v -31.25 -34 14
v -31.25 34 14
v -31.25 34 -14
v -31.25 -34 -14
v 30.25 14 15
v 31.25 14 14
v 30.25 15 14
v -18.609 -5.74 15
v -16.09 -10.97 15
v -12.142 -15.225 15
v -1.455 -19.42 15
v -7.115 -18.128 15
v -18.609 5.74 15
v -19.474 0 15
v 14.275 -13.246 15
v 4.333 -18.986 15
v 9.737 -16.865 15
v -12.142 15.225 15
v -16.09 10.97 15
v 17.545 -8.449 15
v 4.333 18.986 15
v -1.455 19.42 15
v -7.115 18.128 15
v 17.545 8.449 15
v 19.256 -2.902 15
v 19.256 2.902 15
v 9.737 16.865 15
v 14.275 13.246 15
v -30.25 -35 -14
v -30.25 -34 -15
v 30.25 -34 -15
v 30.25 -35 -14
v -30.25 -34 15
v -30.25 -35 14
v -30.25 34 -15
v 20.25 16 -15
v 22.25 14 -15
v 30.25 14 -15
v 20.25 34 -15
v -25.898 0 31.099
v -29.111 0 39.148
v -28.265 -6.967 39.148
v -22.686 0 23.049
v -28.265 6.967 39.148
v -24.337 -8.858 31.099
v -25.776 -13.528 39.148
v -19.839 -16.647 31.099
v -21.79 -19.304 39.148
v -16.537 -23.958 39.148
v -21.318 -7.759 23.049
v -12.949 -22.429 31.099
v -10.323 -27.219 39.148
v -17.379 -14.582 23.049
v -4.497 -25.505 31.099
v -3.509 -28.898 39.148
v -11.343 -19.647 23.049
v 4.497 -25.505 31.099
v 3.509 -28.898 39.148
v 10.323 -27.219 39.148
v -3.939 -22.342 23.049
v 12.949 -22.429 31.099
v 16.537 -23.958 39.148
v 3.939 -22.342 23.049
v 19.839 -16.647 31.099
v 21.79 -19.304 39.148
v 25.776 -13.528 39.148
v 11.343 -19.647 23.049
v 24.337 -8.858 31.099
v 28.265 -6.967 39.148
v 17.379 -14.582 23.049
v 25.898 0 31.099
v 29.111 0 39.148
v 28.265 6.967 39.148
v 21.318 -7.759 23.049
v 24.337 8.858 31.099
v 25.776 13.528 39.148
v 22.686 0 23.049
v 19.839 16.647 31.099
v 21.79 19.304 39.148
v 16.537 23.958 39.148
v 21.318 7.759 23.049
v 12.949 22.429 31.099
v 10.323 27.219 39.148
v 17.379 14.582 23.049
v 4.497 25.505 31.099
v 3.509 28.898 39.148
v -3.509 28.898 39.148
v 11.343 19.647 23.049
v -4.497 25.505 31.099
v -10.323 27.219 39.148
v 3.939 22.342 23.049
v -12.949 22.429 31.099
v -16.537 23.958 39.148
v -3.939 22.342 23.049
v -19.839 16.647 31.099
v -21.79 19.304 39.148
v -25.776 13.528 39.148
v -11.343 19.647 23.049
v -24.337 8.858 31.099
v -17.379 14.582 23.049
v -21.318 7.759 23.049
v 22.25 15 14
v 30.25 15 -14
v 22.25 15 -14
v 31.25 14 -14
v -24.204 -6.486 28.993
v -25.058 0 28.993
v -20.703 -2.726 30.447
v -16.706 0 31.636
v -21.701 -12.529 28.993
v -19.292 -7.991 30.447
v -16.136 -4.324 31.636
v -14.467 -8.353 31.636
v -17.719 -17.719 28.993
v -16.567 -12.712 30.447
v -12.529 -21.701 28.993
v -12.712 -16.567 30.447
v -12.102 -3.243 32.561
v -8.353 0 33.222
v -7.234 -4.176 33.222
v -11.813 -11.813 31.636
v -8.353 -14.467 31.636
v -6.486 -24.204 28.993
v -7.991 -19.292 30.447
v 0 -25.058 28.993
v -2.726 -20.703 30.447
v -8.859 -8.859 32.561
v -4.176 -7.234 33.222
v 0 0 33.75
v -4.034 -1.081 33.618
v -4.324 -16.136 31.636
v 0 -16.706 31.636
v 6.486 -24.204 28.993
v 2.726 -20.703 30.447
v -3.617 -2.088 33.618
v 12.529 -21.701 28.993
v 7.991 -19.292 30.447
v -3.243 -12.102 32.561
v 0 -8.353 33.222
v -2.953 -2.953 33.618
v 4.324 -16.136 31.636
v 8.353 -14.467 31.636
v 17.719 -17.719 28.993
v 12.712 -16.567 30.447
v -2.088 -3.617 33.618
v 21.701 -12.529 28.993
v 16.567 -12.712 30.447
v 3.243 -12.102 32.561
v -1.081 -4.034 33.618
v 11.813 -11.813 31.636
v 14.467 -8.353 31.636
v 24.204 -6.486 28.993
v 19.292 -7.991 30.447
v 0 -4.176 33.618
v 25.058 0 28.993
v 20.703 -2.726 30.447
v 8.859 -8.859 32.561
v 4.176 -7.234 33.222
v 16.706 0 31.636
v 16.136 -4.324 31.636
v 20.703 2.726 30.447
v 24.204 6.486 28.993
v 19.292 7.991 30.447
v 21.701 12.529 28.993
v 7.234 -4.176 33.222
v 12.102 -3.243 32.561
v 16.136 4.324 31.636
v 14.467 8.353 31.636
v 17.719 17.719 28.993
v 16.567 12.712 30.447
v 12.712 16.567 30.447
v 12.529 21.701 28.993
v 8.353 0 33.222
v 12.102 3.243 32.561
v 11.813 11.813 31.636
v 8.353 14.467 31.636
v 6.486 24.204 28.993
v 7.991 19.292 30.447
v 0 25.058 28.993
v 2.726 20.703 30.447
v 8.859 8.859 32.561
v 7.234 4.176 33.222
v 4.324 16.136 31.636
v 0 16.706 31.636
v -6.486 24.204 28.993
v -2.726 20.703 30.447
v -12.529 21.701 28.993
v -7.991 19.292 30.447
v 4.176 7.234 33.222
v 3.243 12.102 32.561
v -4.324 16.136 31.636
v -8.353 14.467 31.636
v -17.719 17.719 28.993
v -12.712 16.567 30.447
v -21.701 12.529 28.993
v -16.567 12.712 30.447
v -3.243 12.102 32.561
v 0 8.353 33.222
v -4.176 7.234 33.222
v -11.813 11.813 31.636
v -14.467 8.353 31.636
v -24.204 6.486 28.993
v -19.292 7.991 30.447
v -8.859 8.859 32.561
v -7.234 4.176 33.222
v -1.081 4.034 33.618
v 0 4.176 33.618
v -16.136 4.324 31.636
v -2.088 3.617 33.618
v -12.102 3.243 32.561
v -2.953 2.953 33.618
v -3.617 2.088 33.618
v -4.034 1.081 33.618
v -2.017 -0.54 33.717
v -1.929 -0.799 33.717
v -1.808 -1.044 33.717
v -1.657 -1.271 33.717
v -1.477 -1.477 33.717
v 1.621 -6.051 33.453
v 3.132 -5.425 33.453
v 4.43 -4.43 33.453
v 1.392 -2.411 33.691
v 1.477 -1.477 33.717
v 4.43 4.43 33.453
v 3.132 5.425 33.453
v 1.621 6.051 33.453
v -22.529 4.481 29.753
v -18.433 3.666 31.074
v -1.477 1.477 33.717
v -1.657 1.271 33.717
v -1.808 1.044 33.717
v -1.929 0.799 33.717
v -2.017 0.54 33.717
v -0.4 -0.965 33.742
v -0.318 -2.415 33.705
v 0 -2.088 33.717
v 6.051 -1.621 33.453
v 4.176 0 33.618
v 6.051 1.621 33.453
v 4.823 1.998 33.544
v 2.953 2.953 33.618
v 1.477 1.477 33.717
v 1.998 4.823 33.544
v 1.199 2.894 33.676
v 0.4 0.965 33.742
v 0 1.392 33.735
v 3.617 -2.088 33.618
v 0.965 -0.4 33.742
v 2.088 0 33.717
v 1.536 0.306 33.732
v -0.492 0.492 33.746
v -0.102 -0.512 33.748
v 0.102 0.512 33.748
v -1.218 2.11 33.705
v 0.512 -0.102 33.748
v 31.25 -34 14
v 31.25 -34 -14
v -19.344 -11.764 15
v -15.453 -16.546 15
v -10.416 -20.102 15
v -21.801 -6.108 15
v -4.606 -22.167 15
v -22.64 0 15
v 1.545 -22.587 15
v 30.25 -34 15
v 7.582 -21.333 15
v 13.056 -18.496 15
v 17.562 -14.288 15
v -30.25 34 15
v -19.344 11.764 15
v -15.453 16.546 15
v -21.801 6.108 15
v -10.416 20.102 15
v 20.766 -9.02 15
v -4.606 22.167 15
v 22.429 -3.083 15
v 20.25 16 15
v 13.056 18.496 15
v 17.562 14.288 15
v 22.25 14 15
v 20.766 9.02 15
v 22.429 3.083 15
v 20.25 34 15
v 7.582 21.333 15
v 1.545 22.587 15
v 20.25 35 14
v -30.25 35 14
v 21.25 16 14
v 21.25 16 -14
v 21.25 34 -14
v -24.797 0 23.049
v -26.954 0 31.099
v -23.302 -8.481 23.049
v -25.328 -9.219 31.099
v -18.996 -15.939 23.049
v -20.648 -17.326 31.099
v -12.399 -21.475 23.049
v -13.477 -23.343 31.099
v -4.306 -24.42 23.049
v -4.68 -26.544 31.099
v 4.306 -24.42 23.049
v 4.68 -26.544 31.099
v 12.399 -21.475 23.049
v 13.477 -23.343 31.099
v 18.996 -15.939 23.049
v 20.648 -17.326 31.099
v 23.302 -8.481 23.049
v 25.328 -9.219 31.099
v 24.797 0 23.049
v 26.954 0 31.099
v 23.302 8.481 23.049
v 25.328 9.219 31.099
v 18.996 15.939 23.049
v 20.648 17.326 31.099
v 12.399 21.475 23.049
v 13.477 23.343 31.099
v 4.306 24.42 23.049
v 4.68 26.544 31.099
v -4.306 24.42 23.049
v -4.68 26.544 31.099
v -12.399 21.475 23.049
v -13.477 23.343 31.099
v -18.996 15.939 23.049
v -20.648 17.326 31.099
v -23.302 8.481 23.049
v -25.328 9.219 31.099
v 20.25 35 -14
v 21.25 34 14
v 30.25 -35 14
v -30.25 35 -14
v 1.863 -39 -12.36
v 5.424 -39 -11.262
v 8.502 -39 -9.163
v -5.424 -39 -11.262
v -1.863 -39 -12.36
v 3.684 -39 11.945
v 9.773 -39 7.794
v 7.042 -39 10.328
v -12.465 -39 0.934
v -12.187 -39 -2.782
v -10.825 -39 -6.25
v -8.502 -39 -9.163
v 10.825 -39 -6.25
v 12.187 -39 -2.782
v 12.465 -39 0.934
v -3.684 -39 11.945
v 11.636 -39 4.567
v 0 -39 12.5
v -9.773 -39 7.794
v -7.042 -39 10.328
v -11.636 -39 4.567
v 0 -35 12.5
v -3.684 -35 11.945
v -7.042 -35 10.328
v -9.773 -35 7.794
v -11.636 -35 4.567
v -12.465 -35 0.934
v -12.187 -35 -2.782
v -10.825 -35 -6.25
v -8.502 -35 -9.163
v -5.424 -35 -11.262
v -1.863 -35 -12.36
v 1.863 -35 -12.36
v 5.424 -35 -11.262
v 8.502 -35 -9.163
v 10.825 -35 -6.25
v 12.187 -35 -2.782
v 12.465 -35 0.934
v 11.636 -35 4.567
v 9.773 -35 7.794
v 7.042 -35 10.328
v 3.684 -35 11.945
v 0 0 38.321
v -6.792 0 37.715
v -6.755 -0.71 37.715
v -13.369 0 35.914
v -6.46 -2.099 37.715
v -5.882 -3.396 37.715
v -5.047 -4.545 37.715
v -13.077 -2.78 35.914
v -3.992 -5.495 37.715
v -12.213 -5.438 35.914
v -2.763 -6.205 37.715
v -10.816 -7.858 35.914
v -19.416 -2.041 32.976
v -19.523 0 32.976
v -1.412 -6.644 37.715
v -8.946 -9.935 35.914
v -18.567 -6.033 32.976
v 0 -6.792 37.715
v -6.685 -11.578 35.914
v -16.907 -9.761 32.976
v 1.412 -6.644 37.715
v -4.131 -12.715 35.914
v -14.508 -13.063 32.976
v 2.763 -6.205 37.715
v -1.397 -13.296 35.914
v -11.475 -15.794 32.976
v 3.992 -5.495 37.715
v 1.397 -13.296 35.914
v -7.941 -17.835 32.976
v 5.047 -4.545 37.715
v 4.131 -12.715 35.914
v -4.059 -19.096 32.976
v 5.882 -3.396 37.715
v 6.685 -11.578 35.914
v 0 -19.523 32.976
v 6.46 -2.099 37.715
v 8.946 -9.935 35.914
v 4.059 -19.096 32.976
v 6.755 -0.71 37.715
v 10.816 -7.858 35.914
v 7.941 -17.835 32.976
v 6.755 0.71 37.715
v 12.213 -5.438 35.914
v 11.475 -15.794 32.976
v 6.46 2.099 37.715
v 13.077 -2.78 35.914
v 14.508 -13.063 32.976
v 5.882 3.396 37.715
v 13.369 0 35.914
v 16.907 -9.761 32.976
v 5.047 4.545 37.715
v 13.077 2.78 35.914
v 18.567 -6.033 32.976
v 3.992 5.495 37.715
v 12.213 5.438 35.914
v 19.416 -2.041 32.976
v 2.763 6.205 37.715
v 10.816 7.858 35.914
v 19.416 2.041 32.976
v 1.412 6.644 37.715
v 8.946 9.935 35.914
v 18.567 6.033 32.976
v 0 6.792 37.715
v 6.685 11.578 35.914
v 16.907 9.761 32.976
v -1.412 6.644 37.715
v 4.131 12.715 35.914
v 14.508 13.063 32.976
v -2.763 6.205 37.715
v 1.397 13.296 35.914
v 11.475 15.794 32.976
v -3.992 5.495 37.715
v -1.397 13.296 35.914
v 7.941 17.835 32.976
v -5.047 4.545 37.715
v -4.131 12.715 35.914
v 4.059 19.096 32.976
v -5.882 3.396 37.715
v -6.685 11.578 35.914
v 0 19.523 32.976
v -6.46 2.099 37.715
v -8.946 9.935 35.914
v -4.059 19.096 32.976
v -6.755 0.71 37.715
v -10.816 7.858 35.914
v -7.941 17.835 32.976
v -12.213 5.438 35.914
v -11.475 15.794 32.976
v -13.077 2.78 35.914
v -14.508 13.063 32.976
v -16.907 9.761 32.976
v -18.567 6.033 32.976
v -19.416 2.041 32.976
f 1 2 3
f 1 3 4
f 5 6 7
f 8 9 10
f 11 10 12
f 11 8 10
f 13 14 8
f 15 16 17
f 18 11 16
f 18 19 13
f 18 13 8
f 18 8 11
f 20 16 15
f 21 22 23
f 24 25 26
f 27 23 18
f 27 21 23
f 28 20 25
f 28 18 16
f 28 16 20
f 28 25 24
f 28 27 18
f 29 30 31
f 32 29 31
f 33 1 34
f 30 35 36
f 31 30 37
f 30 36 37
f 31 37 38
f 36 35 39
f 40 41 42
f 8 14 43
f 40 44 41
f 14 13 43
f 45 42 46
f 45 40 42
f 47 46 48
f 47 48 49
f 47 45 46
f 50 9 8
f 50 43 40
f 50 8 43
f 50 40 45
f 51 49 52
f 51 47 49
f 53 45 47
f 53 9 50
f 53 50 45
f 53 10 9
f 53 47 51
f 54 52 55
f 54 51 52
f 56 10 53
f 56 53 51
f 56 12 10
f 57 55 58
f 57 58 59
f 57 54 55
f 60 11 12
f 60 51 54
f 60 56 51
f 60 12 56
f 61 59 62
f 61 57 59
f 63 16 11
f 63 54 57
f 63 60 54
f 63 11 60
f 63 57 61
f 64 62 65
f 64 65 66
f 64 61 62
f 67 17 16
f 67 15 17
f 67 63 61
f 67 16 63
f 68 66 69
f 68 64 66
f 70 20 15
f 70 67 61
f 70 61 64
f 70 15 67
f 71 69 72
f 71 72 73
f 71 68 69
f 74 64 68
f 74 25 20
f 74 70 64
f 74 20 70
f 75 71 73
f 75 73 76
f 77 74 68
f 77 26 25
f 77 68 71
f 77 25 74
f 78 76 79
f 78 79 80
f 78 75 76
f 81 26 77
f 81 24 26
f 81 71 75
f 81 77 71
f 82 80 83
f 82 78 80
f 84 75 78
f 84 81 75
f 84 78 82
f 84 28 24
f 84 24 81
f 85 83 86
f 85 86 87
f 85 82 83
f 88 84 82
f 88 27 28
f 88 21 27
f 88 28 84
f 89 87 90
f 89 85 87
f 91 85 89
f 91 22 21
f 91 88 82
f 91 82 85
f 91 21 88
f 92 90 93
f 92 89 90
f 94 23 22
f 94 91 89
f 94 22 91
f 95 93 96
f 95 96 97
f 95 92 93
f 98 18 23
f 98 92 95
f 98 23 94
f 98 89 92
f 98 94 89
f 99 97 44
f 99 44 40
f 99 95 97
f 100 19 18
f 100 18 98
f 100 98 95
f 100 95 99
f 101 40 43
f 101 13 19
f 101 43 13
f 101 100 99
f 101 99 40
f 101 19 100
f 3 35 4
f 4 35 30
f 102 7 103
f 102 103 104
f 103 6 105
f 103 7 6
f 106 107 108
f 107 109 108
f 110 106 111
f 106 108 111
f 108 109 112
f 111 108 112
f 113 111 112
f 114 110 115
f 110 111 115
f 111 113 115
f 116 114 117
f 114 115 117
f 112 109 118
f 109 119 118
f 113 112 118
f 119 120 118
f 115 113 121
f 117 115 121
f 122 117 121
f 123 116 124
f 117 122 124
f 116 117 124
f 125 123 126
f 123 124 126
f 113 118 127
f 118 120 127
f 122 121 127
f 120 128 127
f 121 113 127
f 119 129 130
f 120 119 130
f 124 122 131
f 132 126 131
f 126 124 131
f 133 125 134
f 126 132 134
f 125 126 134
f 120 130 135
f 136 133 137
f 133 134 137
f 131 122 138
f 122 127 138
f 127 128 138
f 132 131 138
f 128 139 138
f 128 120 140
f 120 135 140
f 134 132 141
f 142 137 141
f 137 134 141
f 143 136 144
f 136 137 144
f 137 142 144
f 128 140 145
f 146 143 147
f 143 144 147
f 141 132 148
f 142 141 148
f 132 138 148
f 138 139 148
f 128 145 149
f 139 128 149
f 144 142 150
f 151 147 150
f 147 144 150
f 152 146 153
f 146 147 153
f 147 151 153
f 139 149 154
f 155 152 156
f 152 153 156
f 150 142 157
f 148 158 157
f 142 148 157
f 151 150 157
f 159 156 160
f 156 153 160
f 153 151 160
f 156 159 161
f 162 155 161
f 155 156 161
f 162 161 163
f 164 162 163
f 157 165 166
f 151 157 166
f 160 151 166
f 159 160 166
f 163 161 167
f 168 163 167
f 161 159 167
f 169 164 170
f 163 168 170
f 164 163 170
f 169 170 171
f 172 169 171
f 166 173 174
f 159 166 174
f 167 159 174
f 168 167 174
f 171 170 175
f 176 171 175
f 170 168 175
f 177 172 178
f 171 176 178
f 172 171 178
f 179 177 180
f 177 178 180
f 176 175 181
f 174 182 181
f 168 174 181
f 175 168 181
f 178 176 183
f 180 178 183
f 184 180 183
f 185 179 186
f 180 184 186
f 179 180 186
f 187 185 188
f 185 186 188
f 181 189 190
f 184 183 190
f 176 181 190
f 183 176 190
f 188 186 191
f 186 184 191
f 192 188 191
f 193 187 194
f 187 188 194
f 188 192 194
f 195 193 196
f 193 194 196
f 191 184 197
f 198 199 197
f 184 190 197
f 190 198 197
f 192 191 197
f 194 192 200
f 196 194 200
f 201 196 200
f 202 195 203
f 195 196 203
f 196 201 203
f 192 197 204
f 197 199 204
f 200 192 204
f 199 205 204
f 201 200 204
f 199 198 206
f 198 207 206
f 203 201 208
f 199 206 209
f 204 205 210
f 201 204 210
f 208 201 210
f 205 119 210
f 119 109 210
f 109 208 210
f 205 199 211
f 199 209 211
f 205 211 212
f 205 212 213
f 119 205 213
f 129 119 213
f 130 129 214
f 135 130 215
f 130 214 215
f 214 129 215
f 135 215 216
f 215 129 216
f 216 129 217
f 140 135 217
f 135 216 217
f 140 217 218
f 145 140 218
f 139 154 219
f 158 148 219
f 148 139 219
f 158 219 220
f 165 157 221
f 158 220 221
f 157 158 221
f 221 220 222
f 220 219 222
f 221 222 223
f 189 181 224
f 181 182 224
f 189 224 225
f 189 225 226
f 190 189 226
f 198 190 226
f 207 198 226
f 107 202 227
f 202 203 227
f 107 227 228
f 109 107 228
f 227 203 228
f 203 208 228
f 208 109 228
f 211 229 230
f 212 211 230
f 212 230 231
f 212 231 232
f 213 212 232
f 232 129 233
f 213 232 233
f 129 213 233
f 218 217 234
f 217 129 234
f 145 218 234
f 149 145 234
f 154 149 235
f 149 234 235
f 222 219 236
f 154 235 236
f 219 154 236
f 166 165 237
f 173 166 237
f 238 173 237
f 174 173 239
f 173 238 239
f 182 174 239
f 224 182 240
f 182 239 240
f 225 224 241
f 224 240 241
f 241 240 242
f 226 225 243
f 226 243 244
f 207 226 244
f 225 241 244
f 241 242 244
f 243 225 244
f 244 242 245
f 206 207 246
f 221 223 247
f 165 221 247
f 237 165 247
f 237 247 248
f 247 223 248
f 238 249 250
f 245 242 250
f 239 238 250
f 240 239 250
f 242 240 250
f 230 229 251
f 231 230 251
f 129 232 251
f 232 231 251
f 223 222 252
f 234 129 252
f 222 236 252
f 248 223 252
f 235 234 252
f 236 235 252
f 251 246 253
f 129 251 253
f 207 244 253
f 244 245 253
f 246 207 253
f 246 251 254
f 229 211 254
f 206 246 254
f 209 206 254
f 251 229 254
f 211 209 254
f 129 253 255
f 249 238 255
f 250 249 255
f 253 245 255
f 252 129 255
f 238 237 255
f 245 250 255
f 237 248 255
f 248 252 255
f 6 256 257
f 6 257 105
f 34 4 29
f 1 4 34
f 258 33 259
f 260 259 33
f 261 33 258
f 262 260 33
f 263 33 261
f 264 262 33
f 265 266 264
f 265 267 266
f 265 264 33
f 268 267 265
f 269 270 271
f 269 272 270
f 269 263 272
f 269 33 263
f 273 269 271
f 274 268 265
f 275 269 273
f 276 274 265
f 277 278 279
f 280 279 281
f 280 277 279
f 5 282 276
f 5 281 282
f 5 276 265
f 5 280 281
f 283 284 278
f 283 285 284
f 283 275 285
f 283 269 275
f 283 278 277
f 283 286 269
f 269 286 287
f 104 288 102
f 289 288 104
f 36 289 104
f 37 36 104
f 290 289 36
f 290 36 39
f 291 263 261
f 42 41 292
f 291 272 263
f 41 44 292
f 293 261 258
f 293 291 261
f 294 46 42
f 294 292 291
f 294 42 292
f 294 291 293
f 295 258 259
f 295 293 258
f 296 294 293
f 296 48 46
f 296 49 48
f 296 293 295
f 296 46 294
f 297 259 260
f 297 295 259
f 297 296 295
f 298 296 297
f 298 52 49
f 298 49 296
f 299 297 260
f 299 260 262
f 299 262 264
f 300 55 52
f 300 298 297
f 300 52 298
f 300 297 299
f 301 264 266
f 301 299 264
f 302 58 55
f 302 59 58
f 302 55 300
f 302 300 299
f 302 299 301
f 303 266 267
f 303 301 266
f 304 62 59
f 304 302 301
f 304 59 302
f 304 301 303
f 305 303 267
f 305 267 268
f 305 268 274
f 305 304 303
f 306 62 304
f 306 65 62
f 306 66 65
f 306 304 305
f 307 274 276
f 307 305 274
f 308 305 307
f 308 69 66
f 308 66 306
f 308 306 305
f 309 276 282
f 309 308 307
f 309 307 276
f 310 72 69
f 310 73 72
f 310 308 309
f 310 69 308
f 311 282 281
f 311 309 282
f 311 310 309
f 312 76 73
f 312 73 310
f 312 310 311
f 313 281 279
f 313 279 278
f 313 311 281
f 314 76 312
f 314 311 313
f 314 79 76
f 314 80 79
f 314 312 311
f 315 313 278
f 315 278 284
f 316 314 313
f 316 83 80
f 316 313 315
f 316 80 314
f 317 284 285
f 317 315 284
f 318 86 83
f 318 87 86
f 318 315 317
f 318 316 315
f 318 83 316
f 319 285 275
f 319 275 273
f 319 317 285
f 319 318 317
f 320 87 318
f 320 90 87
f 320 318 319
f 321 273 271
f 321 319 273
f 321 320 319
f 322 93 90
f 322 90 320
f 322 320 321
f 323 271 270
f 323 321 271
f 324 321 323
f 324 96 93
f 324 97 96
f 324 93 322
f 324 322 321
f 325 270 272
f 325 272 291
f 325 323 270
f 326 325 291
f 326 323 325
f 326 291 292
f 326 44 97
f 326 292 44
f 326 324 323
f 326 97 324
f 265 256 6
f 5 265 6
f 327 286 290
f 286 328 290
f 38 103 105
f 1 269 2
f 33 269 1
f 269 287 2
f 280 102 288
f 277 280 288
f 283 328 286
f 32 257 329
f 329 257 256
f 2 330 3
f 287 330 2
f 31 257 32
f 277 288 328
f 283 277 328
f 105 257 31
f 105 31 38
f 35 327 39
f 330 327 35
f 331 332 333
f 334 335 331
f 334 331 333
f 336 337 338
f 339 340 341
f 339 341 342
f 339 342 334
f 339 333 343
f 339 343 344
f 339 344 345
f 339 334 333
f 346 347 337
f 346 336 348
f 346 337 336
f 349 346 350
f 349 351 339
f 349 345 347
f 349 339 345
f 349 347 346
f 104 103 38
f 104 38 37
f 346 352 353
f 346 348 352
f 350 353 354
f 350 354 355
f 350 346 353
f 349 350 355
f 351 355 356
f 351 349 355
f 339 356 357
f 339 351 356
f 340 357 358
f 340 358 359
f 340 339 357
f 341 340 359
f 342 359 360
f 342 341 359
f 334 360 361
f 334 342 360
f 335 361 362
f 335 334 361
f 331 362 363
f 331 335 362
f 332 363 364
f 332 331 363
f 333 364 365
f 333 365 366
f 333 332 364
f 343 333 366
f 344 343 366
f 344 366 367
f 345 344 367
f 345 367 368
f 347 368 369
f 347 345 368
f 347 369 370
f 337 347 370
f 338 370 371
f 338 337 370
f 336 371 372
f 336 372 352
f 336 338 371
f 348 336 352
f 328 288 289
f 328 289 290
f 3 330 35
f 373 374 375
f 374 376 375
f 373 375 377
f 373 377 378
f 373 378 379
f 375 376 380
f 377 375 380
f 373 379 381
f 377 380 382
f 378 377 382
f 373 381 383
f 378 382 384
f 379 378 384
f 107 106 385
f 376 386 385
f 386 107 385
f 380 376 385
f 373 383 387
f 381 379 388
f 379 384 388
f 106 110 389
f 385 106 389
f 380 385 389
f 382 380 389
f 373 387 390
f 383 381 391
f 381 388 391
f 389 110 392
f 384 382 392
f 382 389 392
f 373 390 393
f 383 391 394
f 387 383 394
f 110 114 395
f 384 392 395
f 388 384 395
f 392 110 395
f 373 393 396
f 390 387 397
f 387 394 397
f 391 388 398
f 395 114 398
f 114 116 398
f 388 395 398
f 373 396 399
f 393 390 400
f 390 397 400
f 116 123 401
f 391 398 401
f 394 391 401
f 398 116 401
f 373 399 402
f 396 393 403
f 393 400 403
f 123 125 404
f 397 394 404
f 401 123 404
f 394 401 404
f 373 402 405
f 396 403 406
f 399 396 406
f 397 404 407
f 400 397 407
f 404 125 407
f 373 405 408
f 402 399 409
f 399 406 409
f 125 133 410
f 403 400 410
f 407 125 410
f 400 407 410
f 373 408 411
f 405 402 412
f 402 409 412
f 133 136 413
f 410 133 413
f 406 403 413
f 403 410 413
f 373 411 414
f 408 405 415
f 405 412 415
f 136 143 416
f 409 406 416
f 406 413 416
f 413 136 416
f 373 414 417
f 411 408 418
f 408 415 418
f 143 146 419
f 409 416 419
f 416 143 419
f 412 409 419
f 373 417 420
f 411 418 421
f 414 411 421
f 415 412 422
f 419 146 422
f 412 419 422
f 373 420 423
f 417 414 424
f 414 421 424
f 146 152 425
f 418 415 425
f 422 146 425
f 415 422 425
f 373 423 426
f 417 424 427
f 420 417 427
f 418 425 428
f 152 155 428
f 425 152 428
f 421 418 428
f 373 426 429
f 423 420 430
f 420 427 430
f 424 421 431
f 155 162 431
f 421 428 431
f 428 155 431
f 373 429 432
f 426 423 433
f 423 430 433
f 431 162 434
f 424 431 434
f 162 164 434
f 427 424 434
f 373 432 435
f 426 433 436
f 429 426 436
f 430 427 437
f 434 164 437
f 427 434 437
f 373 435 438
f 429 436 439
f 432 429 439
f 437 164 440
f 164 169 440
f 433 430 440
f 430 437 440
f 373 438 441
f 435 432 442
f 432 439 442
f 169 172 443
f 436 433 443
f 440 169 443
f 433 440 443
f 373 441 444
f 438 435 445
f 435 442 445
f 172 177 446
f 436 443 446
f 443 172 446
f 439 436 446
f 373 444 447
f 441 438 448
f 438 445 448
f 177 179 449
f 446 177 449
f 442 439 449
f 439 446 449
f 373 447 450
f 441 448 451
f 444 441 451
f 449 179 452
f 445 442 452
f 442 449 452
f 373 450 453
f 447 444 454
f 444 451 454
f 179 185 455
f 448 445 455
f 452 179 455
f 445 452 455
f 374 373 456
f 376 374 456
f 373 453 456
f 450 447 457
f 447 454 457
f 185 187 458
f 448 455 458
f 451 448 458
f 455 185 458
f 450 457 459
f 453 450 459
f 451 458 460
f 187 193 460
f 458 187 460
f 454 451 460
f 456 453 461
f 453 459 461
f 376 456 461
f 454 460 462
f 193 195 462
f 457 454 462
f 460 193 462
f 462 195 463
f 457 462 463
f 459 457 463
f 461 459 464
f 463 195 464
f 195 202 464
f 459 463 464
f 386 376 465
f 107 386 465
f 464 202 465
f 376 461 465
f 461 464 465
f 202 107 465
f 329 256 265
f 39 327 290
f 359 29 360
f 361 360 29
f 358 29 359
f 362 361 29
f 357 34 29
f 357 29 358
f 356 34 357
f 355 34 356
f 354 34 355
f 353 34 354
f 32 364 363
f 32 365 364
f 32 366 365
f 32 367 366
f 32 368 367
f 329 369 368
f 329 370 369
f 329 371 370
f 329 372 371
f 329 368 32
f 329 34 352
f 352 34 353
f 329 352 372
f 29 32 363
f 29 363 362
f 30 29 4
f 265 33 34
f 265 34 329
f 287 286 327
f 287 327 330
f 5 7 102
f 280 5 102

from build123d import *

# Parameters (mm, degrees)
BOSS_EXTRUDE1_DEPTH = 15
SKETCH2_R           = 12.5
BOSS_EXTRUDE2_DEPTH = 4
CHAMFER1_SIZE       = 1


with BuildPart() as part:
    # Sketch1 → Boss-Extrude1 (new, symmetric)
    with BuildSketch(Plane.XY):
        Polygon((21.25, 35), (-31.25, 35), (-31.25, -35), (31.25, -35), (31.25, 15), (21.25, 15), align=None)
    extrude(amount=BOSS_EXTRUDE1_DEPTH, both=True)

    # Sketch2 → Boss-Extrude2 (add, symmetric)
    with BuildSketch(Plane.XZ.offset(35)):
        with Locations(Location((0, 0, 0), (0, 0, 90))):
            Circle(SKETCH2_R)
    extrude(amount=BOSS_EXTRUDE2_DEPTH, both=True)

    # Chamfer1
    chamfer1_edges = [part.edges().sort_by_distance(p)[0] for p in [
        (-31.25, 35, 0),
        (21.25, 35, 0),
        (21.25, 15, 0),
        (31.25, 15, 0),
        (31.25, -35, 0),
        (-31.25, -35, 0),
        (31.25, -10, 15),
        (26.25, 15, 15),
        (21.25, 25, 15),
        (-5, 35, 15),
        (-31.25, 0, 15),
        (-5, 35, -15),
        (21.25, 25, -15),
        (26.25, 15, -15),
        (31.25, -10, -15),
        (0, -35, -15),
        (-31.25, 0, -15),
        (0, -35, 15),
    ]]
    chamfer(chamfer1_edges, length=CHAMFER1_SIZE)

    # Sketch4 → Revolve1 (revolve)
    with BuildSketch(Plane(origin=(0, 0, 0), x_dir=(1, 0, 0), z_dir=(0, 1, 0))):
        Polygon((-22.640271435, -15), (-29.110747562, -39.148145657), (-19.473991816, -15), align=None)
    revolve(axis=Axis((0, 0, 0), (0, 0, 1)))


with BuildPart() as body_2:
    # Sketch5 → Revolve2 (revolve)
    with BuildSketch(Plane(origin=(0, 0, 0), x_dir=(1, 0, 0), z_dir=(0, 1, 0))):
        with BuildLine():
            Line((0, -33.750156277), (0, -38.321403444))
            ThreePointArc((0, -38.321403444), (-13.369092543, -35.913748433), (-25.058279875, -28.993319431))
            add(Edge.make_bspline(
                [(-25.058279875, -28.993319431), (-12.529139937, -33.750156277), (0, -33.750156277)],
                knots=[0, 0, 0, 0.5, 0.5, 0.5], degree=2))
        make_face()
    revolve(axis=Axis((0, 0, 0), (0, 0, 1)))


solid = Compound([part.part, body_2.part])
